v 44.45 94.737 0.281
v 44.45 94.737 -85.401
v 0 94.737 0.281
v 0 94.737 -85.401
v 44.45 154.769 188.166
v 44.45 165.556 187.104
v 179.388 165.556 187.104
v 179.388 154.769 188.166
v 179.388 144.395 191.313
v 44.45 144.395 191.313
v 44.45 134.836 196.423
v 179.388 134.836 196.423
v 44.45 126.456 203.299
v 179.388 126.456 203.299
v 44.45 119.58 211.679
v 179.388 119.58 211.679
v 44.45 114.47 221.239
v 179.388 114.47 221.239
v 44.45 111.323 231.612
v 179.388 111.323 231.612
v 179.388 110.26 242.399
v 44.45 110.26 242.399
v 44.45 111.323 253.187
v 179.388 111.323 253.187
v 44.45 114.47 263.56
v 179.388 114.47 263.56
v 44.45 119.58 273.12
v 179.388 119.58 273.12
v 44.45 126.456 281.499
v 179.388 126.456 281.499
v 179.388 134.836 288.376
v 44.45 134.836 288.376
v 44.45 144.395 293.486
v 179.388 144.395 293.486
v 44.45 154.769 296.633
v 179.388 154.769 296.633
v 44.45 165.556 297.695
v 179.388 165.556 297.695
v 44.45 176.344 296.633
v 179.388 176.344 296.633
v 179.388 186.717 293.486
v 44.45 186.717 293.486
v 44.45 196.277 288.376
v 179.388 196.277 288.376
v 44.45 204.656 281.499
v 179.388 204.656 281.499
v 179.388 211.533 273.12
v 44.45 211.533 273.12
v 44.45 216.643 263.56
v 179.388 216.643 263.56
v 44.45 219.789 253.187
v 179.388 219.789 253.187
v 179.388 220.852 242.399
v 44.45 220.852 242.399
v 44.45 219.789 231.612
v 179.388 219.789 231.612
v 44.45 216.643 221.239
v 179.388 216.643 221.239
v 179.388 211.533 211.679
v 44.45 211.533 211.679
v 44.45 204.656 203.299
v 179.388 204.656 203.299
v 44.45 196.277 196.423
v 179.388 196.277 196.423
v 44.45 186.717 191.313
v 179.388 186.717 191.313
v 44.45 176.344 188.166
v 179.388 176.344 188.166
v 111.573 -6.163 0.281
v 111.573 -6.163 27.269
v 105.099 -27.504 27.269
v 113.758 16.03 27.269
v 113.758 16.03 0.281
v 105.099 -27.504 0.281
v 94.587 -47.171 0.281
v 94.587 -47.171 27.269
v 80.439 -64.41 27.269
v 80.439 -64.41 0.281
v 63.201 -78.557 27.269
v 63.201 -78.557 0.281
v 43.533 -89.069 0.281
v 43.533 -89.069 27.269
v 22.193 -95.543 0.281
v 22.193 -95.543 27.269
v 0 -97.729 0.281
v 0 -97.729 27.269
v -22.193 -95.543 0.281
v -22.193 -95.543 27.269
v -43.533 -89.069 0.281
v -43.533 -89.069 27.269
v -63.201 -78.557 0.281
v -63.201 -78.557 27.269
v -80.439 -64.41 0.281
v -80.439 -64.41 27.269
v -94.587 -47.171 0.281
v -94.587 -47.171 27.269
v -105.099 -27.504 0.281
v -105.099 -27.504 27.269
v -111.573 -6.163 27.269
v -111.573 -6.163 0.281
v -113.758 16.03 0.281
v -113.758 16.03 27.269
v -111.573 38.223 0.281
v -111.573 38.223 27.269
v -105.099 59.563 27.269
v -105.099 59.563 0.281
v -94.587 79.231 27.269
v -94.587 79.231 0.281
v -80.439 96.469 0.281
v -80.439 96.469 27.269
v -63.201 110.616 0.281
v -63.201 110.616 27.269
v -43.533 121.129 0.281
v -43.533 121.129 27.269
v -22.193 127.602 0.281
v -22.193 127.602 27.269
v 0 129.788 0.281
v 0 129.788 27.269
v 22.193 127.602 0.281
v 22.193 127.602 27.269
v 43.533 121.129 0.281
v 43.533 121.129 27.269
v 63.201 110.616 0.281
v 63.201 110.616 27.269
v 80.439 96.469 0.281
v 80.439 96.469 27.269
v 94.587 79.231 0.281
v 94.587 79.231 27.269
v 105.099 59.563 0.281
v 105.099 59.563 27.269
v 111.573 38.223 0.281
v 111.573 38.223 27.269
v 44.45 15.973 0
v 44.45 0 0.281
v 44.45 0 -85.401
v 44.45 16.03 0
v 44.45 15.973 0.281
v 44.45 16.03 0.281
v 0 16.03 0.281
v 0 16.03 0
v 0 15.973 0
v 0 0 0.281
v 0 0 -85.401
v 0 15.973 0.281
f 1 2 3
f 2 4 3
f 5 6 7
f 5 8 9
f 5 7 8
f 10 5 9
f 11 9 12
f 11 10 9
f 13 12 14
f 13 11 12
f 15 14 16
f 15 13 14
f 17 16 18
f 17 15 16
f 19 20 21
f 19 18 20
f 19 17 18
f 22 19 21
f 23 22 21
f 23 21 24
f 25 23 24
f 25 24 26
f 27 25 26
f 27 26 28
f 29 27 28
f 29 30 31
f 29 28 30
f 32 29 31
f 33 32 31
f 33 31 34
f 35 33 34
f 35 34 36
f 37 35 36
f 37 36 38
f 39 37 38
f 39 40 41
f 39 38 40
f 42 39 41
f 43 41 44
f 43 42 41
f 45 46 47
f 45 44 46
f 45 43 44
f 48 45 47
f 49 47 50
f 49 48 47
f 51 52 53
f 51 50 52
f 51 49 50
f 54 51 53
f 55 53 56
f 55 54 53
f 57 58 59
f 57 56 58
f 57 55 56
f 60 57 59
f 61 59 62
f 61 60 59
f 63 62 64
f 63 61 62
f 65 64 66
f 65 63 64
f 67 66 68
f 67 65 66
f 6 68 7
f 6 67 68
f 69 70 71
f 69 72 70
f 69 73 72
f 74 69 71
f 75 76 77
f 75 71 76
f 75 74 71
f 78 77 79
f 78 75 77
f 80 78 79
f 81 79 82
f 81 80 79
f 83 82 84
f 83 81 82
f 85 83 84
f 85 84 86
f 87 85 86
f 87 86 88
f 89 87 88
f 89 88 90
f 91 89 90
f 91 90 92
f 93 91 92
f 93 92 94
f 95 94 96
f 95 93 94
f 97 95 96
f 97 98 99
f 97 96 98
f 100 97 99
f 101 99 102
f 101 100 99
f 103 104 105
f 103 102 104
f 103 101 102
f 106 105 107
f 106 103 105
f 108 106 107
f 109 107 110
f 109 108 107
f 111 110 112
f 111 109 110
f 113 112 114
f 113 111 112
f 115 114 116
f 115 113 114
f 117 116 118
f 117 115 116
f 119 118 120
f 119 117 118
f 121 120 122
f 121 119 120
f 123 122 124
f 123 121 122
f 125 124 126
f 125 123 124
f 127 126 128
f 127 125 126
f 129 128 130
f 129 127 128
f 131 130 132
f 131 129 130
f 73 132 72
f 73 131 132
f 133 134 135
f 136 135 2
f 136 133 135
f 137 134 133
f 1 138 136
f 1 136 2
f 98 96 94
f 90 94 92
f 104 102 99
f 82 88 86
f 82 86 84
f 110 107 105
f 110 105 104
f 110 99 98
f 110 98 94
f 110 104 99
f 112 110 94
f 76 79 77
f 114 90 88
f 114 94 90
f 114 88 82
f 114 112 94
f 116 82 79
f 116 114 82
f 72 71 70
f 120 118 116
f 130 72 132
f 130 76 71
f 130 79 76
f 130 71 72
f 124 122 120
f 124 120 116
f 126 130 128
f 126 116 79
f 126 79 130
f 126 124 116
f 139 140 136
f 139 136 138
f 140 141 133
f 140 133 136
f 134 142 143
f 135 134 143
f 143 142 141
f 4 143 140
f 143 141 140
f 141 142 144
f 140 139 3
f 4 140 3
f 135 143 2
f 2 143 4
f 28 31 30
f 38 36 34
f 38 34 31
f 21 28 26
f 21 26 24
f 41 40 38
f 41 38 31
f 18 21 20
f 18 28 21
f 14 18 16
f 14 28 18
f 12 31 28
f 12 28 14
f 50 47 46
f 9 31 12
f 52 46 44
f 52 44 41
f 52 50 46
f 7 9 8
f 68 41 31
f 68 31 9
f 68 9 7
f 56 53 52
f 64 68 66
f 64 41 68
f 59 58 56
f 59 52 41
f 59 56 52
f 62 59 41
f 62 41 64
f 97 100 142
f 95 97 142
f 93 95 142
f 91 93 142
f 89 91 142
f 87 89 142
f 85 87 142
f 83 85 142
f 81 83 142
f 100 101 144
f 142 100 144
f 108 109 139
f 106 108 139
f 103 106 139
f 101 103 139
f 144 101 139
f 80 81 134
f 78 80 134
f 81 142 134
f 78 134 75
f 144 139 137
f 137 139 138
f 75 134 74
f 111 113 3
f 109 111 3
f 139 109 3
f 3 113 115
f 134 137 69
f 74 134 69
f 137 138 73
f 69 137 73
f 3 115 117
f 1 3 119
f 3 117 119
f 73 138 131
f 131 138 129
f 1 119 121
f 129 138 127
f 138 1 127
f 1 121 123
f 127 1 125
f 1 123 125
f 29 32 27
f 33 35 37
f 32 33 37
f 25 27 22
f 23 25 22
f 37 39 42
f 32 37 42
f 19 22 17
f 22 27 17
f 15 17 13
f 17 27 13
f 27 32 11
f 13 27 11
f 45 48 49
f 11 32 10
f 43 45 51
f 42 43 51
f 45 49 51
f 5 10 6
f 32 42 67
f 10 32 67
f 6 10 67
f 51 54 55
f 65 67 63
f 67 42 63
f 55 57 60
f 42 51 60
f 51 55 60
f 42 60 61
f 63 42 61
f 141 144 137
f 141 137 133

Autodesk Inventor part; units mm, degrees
ref_plane "YZ Plane" through (0, 0, 0) normal (1, 0, 0) x (0, 1, 0)
ref_plane "XZ Plane" through (0, 0, 0) normal (0, 1, 0) x (-1, 0, 0)
ref_plane "XY Plane" through (0, 0, 0) normal (0, 0, 1) x (1, 0, 0)
sketch "Sketch1" plane through (0, 0, 0) normal (1, 0, 0) x (0, 1, 0)
  line L0 (16.0297, 0.2812) -> (15.9732, 0.2812)
  line L1 (15.9732, 0.2812) -> (15.9732, 0)
  line L2 (15.9732, 0) -> (16.0297, 0)
  line L3 (16.0297, 0) -> (16.0297, 0.2812)
  line L4 (94.7373, 0.2812) -> (0, 0.2812)
  line L5 (0, 0.2812) -> (0, -85.4009)
  line L6 (0, -85.4009) -> (94.7373, -85.4009)
  line L7 (94.7373, -85.4009) -> (94.7373, 0.2812)
  point P0 (0, 0)
extrude "Extrusion1" add sketch "Sketch1" along normal blind 44.45 contours L4 L7 L6 L5 L1 L2 L3
sketch "Sketch2" plane through (44.45, 0, 0) normal (1, 0, 0) x (0, 0, -1)
  circle A0 centre (-242.3993, 165.5562) radius 55.2957
  point P0 (0, 0)
extrude "Extrusion2" add sketch "Sketch2" along normal blind 134.9375
sketch "Sketch3" plane through (0, 16.0297, 0.2812) normal (0, 0, 1) x (1, 0, 0)
  point P0 (0, -16.0297)
sketch "Sketch4" plane through (0, 16.0297, 0.2812) normal (0, 0, 1) x (1, 0, 0)
  circle A0 centre (0, 0) radius 113.7585
  point P0 (2.7076, 1.8404)
extrude "Extrusion3" add sketch "Sketch4" along normal blind 26.9875
properties part number "A2.5_Titus_RectangularPrisim"
